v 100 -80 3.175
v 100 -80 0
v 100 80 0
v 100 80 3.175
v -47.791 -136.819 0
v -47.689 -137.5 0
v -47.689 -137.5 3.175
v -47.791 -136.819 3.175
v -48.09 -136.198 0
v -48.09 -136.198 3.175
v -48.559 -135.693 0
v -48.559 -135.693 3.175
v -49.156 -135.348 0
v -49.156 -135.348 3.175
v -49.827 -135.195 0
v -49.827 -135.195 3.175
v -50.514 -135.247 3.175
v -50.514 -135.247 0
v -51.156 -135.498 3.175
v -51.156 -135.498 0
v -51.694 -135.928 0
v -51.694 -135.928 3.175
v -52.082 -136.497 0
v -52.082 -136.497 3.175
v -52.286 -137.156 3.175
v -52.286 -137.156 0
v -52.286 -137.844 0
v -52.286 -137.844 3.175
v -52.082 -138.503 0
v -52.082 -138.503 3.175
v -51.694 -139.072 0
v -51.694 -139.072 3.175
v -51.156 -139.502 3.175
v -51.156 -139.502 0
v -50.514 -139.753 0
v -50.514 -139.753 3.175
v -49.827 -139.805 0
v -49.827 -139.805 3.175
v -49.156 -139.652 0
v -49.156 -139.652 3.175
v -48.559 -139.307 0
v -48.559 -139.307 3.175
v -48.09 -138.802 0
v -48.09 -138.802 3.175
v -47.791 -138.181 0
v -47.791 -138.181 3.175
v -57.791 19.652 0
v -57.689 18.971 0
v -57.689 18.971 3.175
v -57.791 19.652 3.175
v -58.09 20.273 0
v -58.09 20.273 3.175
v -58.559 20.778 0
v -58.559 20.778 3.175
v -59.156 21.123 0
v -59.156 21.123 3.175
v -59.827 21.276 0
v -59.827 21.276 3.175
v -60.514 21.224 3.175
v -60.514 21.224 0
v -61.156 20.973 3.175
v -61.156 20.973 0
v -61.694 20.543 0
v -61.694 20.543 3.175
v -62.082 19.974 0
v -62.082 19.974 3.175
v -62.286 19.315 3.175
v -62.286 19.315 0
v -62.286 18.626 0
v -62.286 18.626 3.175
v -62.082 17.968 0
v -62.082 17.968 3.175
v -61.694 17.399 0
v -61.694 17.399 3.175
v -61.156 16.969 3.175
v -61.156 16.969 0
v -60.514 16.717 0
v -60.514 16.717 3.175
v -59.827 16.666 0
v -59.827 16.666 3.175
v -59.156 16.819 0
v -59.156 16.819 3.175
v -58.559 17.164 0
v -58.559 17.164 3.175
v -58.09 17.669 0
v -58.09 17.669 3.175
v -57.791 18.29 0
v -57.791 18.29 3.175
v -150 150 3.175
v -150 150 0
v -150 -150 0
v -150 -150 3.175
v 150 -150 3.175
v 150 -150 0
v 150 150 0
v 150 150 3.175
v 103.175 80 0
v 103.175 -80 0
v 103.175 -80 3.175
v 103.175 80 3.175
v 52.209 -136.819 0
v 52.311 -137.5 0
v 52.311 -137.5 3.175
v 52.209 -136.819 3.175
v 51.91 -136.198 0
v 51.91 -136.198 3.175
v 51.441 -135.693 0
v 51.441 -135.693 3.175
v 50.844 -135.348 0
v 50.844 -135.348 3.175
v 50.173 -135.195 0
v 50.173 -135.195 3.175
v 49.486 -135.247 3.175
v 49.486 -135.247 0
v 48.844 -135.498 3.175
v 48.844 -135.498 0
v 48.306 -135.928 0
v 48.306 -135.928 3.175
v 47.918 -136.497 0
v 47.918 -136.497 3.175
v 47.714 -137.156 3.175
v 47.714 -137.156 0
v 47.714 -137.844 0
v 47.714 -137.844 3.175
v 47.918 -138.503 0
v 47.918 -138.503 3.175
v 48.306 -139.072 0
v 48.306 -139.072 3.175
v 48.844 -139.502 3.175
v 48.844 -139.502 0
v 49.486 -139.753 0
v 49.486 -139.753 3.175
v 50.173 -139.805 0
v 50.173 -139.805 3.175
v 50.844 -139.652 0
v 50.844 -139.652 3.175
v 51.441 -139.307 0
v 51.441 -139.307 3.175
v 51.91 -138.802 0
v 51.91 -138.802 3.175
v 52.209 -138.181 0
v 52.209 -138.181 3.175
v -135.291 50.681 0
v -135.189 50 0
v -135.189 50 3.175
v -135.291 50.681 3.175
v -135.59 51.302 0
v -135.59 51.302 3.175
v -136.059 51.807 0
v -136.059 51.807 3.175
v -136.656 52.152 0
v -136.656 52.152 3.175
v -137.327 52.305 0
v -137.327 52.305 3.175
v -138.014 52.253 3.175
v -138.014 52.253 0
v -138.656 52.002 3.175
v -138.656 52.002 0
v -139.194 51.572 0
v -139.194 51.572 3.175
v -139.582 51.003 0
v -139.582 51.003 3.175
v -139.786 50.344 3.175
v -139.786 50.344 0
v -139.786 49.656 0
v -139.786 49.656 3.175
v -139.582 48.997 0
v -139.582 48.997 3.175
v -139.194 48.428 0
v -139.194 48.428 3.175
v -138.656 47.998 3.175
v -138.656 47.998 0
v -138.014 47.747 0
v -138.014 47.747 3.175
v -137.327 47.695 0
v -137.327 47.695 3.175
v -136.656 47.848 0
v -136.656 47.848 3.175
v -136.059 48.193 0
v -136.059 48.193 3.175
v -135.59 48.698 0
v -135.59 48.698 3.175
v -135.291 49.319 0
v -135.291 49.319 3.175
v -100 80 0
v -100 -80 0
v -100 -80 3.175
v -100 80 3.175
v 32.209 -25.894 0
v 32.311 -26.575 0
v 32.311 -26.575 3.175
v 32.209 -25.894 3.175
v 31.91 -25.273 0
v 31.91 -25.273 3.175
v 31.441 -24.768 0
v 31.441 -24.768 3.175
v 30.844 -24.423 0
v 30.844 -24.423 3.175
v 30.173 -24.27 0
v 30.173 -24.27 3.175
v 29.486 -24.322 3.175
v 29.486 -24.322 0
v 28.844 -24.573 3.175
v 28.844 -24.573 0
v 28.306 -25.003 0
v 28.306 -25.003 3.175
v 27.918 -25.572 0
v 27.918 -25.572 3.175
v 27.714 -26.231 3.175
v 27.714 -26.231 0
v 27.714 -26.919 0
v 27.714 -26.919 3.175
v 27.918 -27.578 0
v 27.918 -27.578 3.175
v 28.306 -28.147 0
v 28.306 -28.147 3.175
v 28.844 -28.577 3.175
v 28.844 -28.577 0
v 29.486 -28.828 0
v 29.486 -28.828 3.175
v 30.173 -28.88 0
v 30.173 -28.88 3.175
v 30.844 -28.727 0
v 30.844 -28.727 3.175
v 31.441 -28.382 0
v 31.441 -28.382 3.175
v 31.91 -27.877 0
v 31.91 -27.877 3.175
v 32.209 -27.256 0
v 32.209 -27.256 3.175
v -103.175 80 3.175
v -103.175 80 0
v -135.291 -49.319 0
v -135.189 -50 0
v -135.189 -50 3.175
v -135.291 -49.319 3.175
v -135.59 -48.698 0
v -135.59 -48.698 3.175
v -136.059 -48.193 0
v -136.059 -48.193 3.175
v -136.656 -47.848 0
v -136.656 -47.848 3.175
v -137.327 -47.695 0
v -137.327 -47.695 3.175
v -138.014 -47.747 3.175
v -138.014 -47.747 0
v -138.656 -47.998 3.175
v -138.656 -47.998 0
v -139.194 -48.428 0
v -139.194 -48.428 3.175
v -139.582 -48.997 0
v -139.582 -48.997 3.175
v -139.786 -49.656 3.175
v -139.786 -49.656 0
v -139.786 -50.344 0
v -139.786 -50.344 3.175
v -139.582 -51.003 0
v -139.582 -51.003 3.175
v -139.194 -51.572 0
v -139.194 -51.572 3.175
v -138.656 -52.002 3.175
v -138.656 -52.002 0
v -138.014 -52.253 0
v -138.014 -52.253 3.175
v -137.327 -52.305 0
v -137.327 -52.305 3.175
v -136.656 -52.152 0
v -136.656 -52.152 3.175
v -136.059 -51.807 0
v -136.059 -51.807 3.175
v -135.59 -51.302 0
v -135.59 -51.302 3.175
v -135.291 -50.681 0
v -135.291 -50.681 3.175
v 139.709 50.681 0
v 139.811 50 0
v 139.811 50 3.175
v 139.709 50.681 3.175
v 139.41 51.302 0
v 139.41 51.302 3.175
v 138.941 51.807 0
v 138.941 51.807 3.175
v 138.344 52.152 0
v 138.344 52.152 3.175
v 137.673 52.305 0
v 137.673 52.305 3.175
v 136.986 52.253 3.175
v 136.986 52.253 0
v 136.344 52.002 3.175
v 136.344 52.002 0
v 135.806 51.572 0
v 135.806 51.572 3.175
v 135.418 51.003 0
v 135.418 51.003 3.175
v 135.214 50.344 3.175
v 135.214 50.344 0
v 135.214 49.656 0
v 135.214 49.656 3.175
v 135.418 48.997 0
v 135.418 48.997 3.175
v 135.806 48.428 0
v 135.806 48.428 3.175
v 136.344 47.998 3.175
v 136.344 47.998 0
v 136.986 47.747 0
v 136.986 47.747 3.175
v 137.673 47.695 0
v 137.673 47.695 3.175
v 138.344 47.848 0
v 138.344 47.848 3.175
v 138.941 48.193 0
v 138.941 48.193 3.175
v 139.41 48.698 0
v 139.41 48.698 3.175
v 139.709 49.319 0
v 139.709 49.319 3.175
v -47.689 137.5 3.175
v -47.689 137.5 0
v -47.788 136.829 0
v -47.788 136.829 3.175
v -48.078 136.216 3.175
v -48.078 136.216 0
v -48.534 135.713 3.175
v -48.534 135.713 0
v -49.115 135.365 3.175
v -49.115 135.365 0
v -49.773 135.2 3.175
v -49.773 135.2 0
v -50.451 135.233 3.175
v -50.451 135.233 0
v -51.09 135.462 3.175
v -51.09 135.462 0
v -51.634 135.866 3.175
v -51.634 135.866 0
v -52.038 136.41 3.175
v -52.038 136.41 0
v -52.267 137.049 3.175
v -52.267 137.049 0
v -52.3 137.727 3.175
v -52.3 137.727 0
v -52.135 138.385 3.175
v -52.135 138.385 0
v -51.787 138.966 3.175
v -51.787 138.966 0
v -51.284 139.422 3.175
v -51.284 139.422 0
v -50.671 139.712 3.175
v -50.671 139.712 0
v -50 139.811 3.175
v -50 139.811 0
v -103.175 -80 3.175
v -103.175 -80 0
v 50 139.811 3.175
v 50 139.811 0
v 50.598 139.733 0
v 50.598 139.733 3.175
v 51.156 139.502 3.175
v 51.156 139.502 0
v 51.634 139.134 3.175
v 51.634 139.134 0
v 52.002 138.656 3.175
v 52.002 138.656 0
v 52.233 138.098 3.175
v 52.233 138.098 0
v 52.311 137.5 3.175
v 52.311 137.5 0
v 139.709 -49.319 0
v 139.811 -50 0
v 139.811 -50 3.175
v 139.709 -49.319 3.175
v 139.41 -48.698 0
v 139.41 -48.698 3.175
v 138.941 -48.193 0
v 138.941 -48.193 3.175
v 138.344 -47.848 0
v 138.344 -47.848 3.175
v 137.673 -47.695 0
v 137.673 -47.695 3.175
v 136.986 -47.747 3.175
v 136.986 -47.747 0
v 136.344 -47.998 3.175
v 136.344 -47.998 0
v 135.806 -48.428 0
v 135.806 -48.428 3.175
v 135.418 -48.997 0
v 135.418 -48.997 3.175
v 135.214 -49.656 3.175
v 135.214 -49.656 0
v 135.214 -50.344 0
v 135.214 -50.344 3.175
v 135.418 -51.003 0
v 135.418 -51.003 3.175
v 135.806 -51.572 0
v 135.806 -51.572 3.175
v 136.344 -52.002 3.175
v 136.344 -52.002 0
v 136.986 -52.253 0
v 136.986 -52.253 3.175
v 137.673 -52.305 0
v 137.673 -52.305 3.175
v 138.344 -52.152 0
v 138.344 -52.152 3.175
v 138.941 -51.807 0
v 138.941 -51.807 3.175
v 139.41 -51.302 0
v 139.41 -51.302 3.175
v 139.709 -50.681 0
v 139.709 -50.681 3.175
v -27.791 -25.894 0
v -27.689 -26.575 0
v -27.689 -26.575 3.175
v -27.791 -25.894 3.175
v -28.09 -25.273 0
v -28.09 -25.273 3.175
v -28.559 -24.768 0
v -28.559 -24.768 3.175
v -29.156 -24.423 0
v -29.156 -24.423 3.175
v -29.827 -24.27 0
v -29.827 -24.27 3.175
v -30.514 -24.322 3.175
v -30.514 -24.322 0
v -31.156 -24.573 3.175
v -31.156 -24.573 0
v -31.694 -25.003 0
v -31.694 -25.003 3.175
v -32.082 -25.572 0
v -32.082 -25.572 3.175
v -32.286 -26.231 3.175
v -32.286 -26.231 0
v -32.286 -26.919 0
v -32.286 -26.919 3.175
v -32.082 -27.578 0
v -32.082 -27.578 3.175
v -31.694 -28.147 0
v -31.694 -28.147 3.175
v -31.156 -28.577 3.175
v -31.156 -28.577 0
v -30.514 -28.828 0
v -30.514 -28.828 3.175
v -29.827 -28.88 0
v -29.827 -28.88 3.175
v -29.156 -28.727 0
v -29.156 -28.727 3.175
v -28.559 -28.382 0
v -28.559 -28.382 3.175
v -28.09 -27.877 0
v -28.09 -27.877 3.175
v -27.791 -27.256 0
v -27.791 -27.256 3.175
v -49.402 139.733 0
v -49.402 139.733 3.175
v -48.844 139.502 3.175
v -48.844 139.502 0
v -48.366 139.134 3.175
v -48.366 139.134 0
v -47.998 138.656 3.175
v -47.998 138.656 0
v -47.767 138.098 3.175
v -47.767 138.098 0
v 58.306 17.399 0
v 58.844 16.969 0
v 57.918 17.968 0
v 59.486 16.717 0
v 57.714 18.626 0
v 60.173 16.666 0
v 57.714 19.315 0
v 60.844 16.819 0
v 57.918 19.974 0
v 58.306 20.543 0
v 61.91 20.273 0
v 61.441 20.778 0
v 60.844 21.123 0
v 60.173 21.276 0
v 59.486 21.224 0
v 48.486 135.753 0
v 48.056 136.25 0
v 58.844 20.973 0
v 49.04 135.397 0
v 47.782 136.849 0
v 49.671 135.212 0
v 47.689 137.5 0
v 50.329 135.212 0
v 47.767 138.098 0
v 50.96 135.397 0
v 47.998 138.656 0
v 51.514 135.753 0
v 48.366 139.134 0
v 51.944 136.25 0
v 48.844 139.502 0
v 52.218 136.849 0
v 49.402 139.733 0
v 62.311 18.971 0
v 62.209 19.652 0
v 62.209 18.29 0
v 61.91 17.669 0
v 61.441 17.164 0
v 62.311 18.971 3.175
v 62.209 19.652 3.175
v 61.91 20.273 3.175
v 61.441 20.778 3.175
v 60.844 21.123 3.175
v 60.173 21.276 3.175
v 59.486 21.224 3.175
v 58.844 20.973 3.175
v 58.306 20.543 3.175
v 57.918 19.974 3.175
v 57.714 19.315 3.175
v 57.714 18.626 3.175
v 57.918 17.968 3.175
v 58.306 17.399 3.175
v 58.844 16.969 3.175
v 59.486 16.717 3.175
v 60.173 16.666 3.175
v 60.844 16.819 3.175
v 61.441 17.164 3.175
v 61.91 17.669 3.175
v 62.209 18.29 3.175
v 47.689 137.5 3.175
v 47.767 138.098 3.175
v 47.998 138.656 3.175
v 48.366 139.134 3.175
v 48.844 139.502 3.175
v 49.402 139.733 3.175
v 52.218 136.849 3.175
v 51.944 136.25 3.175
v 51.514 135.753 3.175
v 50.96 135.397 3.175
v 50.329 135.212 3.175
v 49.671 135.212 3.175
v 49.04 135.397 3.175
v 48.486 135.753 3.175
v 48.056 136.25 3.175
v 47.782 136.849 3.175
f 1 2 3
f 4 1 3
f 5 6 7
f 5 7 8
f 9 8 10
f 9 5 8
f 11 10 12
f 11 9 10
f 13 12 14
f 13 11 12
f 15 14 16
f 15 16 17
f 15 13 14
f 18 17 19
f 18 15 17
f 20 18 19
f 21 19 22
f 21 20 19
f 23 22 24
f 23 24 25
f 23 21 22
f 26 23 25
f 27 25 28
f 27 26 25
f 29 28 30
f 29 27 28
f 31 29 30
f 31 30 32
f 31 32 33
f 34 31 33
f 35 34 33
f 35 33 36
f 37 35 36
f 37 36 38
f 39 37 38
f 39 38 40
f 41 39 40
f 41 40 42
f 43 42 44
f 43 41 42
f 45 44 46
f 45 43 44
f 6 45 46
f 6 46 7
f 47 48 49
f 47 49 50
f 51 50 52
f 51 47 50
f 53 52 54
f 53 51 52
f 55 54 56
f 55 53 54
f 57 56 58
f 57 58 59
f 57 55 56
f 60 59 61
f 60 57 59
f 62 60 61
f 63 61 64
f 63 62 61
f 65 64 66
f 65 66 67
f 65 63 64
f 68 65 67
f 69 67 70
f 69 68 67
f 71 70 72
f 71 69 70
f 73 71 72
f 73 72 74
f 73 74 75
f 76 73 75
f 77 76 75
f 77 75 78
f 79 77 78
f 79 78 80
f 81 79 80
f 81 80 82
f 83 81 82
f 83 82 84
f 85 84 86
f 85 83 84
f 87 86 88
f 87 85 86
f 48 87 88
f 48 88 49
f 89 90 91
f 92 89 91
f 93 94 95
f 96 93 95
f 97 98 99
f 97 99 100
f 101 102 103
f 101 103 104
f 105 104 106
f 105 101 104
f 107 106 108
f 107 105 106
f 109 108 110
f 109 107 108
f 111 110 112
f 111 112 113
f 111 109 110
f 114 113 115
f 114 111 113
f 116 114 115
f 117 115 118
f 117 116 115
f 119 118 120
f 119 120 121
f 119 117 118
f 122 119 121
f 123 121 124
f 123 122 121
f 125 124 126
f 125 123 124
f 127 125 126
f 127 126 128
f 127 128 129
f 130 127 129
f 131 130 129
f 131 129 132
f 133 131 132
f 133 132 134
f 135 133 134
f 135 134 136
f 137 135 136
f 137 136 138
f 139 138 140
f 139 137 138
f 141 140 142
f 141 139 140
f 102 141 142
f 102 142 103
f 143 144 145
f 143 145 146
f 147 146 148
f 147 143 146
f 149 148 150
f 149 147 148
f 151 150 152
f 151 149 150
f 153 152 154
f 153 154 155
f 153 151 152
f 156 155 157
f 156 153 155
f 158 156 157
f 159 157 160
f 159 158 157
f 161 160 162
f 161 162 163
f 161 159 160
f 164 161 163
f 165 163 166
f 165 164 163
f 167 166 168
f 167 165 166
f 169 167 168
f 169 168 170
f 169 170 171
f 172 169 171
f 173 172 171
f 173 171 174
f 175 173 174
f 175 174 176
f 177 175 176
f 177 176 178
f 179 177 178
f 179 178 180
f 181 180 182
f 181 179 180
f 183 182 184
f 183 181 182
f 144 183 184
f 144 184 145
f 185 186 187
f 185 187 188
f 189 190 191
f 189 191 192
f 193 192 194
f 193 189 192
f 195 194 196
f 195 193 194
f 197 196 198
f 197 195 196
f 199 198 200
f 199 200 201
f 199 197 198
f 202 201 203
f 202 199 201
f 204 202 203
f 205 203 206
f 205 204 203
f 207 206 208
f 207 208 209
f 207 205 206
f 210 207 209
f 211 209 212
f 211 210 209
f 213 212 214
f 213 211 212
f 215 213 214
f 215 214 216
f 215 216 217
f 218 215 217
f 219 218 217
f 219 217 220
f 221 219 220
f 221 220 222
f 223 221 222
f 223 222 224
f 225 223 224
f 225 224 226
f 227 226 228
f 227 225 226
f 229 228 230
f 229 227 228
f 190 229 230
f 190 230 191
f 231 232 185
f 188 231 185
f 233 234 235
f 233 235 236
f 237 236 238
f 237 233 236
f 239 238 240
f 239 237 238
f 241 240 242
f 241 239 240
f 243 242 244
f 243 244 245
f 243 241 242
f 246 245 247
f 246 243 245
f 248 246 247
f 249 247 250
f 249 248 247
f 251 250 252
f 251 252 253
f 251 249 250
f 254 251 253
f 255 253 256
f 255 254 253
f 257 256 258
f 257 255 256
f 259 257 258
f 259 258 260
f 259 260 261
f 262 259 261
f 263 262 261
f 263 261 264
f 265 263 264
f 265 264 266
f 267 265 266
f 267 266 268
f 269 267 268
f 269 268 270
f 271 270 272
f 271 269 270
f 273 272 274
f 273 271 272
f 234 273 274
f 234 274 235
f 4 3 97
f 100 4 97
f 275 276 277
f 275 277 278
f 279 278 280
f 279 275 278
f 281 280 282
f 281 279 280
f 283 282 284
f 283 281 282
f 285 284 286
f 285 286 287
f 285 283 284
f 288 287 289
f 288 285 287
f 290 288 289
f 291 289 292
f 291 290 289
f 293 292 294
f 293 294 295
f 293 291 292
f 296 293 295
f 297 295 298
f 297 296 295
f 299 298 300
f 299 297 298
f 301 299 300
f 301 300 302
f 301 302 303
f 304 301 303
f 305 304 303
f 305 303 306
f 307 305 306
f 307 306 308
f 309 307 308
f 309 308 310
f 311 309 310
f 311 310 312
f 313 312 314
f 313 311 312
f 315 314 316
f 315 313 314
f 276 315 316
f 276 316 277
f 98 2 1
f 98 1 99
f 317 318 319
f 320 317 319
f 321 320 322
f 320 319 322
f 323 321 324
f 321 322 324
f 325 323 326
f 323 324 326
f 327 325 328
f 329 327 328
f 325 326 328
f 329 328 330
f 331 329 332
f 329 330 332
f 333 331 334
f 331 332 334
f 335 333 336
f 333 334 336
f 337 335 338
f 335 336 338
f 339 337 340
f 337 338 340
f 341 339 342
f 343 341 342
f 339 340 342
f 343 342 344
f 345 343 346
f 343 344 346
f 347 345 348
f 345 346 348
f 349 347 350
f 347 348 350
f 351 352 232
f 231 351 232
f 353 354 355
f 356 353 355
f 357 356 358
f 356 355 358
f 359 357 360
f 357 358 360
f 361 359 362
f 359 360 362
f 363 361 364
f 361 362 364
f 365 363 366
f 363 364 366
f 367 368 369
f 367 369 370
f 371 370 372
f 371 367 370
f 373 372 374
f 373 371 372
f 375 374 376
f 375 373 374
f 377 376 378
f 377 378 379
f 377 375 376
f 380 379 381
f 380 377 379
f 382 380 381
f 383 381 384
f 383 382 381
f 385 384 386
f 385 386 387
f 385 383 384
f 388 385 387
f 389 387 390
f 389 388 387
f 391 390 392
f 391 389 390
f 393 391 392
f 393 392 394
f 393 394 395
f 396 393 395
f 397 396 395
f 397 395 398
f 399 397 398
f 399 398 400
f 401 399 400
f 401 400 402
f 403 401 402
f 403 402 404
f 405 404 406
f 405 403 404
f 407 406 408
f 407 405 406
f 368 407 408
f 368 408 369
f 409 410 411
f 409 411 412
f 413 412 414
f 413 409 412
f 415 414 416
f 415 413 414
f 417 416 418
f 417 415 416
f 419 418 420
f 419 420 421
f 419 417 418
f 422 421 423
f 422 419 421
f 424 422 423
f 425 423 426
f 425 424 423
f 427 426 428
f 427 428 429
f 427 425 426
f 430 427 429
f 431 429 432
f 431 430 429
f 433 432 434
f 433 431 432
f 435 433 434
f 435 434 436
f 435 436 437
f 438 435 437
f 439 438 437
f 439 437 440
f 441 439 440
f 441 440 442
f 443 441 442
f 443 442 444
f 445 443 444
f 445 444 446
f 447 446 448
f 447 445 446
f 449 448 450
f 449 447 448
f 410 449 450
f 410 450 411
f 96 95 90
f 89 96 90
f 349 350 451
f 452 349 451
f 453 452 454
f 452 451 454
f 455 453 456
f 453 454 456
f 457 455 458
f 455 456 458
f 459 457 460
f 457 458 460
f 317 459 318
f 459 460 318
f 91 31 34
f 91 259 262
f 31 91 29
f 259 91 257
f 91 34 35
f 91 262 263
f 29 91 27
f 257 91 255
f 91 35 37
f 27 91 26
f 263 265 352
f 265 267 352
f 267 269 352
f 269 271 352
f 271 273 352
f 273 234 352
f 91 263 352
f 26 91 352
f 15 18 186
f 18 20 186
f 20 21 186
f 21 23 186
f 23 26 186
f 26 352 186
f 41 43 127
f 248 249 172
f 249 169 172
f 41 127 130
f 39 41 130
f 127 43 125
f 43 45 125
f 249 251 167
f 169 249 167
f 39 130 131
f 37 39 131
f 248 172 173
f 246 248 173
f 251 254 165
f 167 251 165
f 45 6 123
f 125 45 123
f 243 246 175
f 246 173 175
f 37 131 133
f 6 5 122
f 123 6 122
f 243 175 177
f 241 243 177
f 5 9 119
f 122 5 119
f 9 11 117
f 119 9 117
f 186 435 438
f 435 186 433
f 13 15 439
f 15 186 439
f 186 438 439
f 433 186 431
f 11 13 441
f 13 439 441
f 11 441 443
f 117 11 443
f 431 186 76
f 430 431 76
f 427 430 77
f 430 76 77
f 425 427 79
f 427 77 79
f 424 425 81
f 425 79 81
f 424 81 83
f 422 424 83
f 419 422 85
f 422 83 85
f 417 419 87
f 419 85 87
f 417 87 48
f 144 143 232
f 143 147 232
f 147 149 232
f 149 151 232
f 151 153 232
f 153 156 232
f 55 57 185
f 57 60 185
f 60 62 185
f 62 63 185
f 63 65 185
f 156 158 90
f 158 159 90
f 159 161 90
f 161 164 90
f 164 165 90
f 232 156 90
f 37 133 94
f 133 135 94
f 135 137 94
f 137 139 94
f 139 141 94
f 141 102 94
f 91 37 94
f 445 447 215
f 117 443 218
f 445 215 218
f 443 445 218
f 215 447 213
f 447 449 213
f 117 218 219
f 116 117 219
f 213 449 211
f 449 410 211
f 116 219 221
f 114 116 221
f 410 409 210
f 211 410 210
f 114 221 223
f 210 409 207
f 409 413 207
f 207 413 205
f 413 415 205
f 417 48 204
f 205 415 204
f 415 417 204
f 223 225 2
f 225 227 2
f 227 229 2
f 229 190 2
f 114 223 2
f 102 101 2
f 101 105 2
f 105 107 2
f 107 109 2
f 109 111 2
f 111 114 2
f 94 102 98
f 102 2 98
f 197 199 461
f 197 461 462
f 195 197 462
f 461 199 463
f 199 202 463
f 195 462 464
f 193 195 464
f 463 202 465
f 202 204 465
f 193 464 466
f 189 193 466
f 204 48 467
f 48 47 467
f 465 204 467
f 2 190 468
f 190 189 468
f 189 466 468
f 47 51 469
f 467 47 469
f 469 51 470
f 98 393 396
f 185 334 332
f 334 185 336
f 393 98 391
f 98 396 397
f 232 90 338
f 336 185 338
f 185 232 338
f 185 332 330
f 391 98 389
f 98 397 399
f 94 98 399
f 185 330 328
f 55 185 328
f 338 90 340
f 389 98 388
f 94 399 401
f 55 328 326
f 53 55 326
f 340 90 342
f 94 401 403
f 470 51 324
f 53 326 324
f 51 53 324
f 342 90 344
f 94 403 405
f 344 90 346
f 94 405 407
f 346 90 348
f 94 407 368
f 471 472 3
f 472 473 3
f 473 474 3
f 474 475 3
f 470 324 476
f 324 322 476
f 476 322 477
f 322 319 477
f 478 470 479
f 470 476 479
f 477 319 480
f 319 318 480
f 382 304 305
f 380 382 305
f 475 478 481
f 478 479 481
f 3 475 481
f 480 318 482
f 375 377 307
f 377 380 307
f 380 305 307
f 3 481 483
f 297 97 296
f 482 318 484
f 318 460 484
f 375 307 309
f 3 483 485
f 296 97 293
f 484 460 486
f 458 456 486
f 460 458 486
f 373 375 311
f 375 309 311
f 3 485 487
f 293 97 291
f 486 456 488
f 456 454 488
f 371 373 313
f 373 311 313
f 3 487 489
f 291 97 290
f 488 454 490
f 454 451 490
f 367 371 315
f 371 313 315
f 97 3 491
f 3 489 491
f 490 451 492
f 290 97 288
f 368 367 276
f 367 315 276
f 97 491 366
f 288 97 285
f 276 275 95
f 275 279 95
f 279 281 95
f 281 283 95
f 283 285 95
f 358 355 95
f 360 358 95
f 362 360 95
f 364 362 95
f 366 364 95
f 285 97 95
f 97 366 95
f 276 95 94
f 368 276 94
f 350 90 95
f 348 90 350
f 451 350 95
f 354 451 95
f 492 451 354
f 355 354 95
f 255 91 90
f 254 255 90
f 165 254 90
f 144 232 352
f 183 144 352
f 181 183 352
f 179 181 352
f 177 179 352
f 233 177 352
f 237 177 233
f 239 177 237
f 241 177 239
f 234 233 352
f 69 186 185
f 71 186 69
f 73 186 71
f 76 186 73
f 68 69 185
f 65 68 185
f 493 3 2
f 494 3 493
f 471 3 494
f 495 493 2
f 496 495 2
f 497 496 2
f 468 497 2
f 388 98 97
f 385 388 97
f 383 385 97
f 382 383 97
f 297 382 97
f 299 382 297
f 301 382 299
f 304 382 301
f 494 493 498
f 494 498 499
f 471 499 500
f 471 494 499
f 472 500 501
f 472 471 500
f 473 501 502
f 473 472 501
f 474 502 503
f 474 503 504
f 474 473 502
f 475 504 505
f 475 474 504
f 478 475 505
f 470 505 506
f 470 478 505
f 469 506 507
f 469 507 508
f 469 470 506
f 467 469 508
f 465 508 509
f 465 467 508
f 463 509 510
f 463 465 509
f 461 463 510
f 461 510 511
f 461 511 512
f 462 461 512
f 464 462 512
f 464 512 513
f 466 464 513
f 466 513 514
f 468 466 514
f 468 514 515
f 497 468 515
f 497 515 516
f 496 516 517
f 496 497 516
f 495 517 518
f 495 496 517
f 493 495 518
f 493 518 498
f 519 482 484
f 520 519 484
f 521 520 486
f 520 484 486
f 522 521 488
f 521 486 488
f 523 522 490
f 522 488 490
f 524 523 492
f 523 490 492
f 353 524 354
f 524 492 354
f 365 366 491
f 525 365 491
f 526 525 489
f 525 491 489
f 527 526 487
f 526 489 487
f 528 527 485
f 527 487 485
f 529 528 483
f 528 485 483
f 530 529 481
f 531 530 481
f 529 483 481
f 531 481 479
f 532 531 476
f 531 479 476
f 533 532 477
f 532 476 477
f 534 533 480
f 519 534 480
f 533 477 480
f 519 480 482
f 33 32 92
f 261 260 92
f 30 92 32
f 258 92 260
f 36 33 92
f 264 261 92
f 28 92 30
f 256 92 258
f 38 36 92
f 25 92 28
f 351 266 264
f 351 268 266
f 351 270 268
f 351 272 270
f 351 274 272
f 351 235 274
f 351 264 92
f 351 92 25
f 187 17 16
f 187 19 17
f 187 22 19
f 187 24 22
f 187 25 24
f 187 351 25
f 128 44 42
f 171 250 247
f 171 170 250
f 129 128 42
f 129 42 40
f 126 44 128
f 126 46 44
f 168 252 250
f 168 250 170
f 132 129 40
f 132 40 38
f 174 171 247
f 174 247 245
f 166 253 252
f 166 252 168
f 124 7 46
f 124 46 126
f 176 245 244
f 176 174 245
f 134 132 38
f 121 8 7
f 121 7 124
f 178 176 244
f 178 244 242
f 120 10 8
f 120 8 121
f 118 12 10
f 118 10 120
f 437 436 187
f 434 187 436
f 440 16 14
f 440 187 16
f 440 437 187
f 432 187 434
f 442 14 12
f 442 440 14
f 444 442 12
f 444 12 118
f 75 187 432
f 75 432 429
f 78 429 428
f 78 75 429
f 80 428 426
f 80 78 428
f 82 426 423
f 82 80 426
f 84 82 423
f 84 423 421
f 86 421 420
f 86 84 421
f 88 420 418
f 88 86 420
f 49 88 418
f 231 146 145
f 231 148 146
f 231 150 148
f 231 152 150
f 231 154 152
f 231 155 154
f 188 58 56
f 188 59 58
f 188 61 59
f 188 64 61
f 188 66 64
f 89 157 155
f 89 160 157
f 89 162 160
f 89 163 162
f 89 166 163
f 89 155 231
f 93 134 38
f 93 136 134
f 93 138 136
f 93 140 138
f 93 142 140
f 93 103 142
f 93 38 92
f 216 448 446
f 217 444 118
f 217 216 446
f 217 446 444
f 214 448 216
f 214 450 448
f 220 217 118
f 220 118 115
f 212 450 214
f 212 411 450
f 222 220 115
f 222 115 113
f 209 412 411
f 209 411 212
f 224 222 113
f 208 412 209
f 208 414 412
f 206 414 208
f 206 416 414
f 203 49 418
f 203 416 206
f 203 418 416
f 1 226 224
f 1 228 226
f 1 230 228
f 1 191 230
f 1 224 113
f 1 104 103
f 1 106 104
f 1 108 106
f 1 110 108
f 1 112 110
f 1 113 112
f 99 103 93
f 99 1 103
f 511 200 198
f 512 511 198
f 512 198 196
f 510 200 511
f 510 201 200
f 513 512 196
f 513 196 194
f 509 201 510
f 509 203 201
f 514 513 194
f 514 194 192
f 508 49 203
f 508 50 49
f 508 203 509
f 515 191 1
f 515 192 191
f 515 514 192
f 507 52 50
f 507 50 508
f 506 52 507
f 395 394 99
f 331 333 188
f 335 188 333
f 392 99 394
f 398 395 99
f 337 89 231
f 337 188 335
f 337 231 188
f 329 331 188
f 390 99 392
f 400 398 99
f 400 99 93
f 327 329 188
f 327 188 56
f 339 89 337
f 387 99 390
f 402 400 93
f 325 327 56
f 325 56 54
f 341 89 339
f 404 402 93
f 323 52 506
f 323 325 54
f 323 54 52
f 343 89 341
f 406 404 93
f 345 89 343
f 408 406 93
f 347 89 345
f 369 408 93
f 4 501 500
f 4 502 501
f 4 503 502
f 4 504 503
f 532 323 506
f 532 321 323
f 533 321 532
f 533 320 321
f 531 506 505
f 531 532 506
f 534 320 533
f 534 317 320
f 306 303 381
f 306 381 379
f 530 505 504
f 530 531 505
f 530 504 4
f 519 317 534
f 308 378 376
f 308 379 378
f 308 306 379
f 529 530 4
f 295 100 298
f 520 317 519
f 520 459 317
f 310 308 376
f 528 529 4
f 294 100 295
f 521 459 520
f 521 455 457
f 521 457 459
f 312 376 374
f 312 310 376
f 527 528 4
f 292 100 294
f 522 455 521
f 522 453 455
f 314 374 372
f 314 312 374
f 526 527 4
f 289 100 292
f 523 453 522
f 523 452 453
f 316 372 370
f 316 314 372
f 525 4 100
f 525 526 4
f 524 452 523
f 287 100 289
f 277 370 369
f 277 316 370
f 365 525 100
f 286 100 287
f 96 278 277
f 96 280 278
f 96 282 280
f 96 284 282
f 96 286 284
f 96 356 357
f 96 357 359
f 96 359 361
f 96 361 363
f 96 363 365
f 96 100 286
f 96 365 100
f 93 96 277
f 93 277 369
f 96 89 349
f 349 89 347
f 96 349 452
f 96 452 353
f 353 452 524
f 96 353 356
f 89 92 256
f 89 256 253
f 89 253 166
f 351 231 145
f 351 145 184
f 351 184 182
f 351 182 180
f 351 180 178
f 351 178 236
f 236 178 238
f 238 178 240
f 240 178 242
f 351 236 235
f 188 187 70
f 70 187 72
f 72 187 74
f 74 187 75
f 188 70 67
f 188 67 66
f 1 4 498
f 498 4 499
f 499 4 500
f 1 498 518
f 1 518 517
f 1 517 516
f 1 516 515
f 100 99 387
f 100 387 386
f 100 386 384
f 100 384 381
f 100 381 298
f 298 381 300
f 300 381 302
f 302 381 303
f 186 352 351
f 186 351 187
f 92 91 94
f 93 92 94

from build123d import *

# Parameters (mm, degrees)
F0_R     = 2.3114
F0_W     = 3.175
F0_H     = 160
F1_DEPTH = 3.175


with BuildPart() as f1:
    # F0 (on Top) → F1 (new body)
    with BuildSketch(Plane.XY):
        Polygon((-150, -150), (150, -150), (150, 150), (50, 150), (-50, 150), (-150, 150), align=None)
        with Locations((-50, -137.5)):
            Circle(F0_R, mode=Mode.SUBTRACT)
        with Locations((-137.5, -50)):
            Circle(F0_R, mode=Mode.SUBTRACT)
        with Locations((-101.5875, 0)):
            Rectangle(F0_W, F0_H, mode=Mode.SUBTRACT)
        with Locations((-30, -26.575)):
            Circle(F0_R, mode=Mode.SUBTRACT)
        with Locations((50, -137.5)):
            Circle(F0_R, mode=Mode.SUBTRACT)
        with Locations((30, -26.575)):
            Circle(F0_R, mode=Mode.SUBTRACT)
        with Locations((137.5, -50)):
            Circle(F0_R, mode=Mode.SUBTRACT)
        with Locations((101.5875, 0)):
            Rectangle(F0_W, F0_H, mode=Mode.SUBTRACT)
        with Locations((-137.5, 50)):
            Circle(F0_R, mode=Mode.SUBTRACT)
        with Locations((-60, 18.970938)):
            Circle(F0_R, mode=Mode.SUBTRACT)
        with BuildLine():
            ThreePointArc((-47.6886, 137.5), (-51.634407, 135.865593), (-50, 139.8114))
            ThreePointArc((-50, 139.8114), (-48.365593, 139.134407), (-47.6886, 137.5))
        make_face(mode=Mode.SUBTRACT)
        with Locations((60, 18.970938)):
            Circle(F0_R, mode=Mode.SUBTRACT)
        with Locations((137.5, 50)):
            Circle(F0_R, mode=Mode.SUBTRACT)
        with BuildLine():
            ThreePointArc((52.3114, 137.5), (50, 135.1886), (47.6886, 137.5))
            ThreePointArc((47.6886, 137.5), (48.365593, 139.134407), (50, 139.8114))
            ThreePointArc((50, 139.8114), (51.634407, 139.134407), (52.3114, 137.5))
        make_face(mode=Mode.SUBTRACT)
    extrude(amount=F1_DEPTH)


solid = f1.part
